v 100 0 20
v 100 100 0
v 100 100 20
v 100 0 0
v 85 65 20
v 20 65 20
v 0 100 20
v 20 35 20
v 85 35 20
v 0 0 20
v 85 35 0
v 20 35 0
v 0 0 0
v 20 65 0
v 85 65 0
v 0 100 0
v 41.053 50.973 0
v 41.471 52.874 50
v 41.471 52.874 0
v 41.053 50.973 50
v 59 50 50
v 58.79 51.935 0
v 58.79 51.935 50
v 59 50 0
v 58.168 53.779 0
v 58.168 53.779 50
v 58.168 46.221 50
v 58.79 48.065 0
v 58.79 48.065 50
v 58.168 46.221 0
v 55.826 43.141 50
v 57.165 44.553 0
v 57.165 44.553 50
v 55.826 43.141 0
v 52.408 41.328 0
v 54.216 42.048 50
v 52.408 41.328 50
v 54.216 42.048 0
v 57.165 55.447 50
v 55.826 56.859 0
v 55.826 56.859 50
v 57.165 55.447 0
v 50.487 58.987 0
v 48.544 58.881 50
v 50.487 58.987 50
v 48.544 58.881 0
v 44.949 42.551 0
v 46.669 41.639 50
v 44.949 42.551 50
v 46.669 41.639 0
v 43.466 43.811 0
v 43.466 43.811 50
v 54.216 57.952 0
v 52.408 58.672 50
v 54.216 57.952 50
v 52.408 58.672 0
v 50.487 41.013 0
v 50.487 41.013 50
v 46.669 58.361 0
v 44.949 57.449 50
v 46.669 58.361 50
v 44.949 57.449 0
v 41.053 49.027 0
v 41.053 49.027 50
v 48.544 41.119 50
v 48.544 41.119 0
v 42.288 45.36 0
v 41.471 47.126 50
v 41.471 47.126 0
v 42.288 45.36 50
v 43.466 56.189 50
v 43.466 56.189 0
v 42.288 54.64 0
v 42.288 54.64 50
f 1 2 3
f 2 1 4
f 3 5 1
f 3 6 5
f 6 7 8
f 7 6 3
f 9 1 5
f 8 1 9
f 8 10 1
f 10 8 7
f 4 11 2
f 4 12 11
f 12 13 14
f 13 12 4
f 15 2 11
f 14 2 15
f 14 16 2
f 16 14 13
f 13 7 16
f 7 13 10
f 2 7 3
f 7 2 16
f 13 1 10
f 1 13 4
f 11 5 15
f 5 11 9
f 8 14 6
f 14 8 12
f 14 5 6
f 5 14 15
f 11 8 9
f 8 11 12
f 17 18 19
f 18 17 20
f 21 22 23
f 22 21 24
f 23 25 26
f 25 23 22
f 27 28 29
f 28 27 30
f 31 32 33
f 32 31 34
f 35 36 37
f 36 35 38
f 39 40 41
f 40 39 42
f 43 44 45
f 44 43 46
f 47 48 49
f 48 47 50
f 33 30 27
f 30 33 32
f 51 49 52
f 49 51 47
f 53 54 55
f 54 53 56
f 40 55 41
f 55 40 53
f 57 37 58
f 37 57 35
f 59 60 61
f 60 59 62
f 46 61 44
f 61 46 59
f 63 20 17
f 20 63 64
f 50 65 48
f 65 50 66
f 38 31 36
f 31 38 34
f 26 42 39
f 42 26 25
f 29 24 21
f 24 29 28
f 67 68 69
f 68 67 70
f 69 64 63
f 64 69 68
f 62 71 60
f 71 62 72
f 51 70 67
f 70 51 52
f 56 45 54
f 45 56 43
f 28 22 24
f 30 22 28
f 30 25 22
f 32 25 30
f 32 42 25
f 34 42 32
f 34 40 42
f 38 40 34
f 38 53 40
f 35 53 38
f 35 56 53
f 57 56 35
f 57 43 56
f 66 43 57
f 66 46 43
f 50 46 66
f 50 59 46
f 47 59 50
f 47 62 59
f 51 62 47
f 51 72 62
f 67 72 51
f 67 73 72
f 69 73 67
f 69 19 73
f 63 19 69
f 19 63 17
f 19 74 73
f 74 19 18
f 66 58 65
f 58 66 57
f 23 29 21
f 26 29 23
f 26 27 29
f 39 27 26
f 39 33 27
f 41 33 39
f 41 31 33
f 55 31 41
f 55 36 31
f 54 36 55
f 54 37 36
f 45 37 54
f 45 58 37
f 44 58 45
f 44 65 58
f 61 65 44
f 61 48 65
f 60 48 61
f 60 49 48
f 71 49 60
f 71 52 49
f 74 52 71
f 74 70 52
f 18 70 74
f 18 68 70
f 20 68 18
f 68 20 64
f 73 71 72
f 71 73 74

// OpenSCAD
difference()
{
	cube([100,100,20]);
    translate([20,35,-5]) cube([65,30,40]);
}
translate([50,50,0]) cylinder(d=18,h=50);
